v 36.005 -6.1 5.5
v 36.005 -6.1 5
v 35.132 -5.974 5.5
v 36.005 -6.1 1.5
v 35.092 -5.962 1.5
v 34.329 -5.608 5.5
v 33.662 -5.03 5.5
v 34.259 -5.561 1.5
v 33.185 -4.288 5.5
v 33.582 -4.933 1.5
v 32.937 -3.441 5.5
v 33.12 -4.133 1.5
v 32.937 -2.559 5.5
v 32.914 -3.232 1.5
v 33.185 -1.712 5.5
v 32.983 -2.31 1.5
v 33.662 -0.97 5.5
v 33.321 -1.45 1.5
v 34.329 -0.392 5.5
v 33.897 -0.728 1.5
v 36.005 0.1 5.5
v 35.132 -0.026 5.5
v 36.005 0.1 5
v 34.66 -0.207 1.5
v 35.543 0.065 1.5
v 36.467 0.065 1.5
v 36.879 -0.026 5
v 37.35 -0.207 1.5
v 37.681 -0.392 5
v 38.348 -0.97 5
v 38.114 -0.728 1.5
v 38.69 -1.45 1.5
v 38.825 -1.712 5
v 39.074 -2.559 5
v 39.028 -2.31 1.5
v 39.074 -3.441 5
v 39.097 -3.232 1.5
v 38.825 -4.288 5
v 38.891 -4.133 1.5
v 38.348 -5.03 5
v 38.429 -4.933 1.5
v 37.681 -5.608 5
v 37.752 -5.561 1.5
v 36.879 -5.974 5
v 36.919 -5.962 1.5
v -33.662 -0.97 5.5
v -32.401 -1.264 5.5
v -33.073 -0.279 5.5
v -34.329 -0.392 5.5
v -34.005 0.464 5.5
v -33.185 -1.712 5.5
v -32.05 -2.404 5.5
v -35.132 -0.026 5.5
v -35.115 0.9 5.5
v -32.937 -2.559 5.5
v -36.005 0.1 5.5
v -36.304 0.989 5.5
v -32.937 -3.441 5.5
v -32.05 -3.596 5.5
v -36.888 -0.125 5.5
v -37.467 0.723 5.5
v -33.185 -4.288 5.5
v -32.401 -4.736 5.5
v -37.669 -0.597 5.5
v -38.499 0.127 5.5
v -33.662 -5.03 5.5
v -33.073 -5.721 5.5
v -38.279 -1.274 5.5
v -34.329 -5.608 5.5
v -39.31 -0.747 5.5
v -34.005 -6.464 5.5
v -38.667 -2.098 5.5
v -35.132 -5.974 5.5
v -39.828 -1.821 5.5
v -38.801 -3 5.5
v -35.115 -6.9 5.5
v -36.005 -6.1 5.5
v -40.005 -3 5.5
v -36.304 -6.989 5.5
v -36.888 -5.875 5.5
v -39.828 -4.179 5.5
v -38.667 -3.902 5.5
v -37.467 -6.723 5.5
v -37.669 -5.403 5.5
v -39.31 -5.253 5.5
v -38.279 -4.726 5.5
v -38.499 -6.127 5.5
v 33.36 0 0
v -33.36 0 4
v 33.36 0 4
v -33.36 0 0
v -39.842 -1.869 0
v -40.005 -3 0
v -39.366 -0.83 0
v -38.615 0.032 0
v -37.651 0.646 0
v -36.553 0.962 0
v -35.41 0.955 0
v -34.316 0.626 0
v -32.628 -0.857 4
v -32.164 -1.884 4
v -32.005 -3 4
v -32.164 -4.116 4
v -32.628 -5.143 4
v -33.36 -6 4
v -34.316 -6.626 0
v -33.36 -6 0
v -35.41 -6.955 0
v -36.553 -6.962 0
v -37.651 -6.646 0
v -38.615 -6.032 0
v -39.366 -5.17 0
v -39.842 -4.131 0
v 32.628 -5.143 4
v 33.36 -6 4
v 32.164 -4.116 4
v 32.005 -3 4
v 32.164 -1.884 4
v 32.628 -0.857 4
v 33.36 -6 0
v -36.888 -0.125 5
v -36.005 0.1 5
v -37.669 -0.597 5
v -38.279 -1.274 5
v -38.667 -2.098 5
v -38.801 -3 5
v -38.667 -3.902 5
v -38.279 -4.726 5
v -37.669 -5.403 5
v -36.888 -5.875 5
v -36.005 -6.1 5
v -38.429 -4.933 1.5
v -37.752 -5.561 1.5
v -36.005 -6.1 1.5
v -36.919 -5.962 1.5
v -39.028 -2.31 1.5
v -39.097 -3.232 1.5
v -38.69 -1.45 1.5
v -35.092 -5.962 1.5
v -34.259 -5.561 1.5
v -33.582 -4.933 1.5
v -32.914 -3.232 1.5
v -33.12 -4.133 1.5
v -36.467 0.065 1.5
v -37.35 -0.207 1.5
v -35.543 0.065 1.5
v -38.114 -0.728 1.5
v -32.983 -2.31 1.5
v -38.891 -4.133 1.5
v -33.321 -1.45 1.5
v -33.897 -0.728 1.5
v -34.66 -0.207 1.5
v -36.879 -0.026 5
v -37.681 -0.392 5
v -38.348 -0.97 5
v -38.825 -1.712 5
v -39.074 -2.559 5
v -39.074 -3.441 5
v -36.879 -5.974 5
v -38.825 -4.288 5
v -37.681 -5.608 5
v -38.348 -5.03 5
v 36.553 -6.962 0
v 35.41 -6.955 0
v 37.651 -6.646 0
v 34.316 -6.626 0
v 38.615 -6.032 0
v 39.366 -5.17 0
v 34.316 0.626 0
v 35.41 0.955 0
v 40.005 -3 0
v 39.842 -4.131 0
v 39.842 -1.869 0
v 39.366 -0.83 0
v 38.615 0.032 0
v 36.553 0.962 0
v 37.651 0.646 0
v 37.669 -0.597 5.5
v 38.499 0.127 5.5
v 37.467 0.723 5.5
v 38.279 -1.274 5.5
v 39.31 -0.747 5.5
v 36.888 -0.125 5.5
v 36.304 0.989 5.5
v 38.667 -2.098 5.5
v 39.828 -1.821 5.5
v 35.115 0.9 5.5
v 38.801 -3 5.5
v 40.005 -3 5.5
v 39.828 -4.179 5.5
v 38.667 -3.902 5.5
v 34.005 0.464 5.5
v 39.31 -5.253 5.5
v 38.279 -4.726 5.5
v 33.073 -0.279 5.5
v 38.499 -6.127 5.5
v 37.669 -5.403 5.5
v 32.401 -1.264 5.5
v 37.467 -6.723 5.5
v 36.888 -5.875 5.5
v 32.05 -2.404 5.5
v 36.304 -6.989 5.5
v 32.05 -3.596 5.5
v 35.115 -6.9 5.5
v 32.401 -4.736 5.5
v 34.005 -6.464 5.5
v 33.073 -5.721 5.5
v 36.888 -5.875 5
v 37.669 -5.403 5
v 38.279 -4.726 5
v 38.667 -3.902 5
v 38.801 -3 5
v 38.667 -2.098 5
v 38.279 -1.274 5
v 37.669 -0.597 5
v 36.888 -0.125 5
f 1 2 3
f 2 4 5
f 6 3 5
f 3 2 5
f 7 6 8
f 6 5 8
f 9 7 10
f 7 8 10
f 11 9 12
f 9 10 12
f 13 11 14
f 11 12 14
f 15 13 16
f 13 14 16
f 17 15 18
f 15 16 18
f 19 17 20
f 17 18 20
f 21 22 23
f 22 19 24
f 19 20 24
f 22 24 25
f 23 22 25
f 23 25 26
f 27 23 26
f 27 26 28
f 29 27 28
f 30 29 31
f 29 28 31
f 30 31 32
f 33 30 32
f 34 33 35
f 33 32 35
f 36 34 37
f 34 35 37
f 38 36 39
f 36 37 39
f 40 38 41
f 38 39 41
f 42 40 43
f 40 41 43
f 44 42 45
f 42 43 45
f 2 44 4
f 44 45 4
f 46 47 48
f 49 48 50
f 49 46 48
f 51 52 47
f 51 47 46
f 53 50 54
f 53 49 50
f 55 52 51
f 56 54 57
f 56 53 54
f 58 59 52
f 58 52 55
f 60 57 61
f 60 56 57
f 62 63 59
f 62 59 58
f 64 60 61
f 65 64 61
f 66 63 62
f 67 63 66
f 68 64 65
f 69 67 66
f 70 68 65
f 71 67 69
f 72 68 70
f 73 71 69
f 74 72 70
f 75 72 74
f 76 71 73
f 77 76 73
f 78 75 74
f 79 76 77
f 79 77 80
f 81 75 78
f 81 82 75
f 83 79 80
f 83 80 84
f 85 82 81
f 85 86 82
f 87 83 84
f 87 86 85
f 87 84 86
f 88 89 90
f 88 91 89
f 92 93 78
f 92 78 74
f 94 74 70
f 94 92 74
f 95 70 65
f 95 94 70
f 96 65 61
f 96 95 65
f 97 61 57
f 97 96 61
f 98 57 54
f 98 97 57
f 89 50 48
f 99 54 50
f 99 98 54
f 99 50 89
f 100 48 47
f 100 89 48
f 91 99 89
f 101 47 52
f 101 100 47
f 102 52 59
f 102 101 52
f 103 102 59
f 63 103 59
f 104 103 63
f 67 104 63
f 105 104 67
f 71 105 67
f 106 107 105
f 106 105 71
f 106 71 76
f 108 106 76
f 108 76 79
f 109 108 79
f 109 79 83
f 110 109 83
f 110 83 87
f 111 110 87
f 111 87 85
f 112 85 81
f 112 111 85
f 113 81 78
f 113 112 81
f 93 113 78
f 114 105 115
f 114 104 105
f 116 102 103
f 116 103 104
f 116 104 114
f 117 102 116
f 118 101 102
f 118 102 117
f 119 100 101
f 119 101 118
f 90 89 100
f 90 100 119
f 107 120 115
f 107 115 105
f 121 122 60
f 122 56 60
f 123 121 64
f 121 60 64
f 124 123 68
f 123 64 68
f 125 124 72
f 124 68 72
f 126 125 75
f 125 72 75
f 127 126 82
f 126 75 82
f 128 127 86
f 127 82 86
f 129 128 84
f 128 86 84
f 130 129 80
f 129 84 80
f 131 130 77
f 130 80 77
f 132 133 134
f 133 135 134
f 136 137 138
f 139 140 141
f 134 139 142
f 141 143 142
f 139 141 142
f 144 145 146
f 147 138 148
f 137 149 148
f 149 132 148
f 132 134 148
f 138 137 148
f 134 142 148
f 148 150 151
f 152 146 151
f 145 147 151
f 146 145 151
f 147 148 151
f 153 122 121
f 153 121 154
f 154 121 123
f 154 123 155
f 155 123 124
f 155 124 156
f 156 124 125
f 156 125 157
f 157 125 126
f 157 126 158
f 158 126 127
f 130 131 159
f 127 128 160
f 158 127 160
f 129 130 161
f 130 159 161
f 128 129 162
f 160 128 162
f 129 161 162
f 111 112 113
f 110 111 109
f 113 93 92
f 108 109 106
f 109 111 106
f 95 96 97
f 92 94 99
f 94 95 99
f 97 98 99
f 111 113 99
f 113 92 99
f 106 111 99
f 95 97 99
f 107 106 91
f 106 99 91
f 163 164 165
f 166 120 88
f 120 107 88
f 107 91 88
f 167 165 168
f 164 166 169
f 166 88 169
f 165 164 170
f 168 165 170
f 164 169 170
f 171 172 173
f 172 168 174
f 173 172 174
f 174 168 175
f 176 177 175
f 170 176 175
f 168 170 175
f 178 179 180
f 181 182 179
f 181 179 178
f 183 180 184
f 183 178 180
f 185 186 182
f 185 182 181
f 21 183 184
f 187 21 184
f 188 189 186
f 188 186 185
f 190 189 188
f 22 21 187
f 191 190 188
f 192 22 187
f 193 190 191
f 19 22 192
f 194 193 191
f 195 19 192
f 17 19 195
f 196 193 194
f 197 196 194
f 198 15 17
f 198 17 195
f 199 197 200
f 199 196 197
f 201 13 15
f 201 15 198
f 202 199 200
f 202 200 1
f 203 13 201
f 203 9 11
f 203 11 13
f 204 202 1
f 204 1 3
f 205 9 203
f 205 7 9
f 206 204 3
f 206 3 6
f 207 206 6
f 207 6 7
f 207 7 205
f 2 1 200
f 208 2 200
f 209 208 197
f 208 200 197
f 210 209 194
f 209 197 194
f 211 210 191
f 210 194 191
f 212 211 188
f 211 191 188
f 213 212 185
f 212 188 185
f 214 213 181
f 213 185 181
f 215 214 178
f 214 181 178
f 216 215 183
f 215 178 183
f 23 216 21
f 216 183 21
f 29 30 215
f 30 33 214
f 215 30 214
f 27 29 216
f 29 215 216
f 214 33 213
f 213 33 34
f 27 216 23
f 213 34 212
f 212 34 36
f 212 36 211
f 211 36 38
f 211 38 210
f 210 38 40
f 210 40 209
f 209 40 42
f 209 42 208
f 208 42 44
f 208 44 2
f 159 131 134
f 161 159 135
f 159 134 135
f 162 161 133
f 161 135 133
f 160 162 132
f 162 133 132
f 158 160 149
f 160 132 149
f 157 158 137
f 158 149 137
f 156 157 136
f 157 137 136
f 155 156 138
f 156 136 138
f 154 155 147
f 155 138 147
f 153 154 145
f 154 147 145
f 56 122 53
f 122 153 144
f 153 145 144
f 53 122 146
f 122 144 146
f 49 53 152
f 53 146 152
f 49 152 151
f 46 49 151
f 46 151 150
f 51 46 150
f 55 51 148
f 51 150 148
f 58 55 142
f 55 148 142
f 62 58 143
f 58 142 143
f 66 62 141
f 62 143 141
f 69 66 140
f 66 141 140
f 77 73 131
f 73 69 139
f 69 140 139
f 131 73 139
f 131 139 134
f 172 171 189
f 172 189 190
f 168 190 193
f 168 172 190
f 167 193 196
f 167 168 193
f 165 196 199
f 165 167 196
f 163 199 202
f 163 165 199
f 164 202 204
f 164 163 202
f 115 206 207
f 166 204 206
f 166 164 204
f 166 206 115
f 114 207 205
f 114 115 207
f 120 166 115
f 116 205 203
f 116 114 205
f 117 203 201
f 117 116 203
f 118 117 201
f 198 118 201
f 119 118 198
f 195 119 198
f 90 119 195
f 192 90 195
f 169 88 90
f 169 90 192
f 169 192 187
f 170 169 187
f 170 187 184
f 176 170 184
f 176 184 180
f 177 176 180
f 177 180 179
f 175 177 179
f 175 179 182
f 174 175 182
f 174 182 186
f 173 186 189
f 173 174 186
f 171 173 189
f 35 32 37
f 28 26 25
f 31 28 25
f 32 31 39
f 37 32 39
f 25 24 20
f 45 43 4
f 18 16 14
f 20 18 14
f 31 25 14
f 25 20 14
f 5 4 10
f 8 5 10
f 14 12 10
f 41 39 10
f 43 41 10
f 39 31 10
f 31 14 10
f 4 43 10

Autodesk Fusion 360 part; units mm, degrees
sketch "Sketch1" plane through (0, 0, 0) normal (0, 0, 1) x (1, 0, 0)
  line L0 (0, 0) -> (32, 0)
  line L1 (32, 0) -> (32, -6)
  line L2 (32, -6) -> (0, -6)
  line L3 (0, -6) -> (0, 0)
  circle A0 centre (36.0053, -3) radius 4
  line L4 (32, 0) -> (33.3595, 0)
  line L5 (32, -6) -> (33.3595, -6)
  dimension "d1" = 32
  dimension "d2" = 6
  dimension "d3" = 8
extrude "Extrude1" add sketch "Sketch1" along normal blind 4 contours L0 L1 L2 L3 | L1 A0 L4 L5
extrude "Extrude2" add sketch "Sketch1" along normal blind 5.5 contours A0
hole "Hole1" at (36.0053, -3, 5.5) direction (0, 0, -1) diameter 6.2 depth 4 tip angle 180
sketch "Sketch2" plane through (0, 0, 5.5) normal (0, 0, 1) x (-1, 0, 0)
  circle A0 centre (-36.0053, 3) radius 3.1
  circle A1 centre (-36.0053, 3) radius 4
  arc A2 (-36.0053, 6.1) -> (-36.0053, -0.1) centre (-35.6842, 3) ccw
extrude "Extrude3" add sketch "Sketch2" against normal blind 0.5 contours A0 A2 picked at (-38.8883, 3.2291)
mirror "Mirror1" about plane through (0, -6, 0) normal (-1, 0, 0) of bodies 1 merged
